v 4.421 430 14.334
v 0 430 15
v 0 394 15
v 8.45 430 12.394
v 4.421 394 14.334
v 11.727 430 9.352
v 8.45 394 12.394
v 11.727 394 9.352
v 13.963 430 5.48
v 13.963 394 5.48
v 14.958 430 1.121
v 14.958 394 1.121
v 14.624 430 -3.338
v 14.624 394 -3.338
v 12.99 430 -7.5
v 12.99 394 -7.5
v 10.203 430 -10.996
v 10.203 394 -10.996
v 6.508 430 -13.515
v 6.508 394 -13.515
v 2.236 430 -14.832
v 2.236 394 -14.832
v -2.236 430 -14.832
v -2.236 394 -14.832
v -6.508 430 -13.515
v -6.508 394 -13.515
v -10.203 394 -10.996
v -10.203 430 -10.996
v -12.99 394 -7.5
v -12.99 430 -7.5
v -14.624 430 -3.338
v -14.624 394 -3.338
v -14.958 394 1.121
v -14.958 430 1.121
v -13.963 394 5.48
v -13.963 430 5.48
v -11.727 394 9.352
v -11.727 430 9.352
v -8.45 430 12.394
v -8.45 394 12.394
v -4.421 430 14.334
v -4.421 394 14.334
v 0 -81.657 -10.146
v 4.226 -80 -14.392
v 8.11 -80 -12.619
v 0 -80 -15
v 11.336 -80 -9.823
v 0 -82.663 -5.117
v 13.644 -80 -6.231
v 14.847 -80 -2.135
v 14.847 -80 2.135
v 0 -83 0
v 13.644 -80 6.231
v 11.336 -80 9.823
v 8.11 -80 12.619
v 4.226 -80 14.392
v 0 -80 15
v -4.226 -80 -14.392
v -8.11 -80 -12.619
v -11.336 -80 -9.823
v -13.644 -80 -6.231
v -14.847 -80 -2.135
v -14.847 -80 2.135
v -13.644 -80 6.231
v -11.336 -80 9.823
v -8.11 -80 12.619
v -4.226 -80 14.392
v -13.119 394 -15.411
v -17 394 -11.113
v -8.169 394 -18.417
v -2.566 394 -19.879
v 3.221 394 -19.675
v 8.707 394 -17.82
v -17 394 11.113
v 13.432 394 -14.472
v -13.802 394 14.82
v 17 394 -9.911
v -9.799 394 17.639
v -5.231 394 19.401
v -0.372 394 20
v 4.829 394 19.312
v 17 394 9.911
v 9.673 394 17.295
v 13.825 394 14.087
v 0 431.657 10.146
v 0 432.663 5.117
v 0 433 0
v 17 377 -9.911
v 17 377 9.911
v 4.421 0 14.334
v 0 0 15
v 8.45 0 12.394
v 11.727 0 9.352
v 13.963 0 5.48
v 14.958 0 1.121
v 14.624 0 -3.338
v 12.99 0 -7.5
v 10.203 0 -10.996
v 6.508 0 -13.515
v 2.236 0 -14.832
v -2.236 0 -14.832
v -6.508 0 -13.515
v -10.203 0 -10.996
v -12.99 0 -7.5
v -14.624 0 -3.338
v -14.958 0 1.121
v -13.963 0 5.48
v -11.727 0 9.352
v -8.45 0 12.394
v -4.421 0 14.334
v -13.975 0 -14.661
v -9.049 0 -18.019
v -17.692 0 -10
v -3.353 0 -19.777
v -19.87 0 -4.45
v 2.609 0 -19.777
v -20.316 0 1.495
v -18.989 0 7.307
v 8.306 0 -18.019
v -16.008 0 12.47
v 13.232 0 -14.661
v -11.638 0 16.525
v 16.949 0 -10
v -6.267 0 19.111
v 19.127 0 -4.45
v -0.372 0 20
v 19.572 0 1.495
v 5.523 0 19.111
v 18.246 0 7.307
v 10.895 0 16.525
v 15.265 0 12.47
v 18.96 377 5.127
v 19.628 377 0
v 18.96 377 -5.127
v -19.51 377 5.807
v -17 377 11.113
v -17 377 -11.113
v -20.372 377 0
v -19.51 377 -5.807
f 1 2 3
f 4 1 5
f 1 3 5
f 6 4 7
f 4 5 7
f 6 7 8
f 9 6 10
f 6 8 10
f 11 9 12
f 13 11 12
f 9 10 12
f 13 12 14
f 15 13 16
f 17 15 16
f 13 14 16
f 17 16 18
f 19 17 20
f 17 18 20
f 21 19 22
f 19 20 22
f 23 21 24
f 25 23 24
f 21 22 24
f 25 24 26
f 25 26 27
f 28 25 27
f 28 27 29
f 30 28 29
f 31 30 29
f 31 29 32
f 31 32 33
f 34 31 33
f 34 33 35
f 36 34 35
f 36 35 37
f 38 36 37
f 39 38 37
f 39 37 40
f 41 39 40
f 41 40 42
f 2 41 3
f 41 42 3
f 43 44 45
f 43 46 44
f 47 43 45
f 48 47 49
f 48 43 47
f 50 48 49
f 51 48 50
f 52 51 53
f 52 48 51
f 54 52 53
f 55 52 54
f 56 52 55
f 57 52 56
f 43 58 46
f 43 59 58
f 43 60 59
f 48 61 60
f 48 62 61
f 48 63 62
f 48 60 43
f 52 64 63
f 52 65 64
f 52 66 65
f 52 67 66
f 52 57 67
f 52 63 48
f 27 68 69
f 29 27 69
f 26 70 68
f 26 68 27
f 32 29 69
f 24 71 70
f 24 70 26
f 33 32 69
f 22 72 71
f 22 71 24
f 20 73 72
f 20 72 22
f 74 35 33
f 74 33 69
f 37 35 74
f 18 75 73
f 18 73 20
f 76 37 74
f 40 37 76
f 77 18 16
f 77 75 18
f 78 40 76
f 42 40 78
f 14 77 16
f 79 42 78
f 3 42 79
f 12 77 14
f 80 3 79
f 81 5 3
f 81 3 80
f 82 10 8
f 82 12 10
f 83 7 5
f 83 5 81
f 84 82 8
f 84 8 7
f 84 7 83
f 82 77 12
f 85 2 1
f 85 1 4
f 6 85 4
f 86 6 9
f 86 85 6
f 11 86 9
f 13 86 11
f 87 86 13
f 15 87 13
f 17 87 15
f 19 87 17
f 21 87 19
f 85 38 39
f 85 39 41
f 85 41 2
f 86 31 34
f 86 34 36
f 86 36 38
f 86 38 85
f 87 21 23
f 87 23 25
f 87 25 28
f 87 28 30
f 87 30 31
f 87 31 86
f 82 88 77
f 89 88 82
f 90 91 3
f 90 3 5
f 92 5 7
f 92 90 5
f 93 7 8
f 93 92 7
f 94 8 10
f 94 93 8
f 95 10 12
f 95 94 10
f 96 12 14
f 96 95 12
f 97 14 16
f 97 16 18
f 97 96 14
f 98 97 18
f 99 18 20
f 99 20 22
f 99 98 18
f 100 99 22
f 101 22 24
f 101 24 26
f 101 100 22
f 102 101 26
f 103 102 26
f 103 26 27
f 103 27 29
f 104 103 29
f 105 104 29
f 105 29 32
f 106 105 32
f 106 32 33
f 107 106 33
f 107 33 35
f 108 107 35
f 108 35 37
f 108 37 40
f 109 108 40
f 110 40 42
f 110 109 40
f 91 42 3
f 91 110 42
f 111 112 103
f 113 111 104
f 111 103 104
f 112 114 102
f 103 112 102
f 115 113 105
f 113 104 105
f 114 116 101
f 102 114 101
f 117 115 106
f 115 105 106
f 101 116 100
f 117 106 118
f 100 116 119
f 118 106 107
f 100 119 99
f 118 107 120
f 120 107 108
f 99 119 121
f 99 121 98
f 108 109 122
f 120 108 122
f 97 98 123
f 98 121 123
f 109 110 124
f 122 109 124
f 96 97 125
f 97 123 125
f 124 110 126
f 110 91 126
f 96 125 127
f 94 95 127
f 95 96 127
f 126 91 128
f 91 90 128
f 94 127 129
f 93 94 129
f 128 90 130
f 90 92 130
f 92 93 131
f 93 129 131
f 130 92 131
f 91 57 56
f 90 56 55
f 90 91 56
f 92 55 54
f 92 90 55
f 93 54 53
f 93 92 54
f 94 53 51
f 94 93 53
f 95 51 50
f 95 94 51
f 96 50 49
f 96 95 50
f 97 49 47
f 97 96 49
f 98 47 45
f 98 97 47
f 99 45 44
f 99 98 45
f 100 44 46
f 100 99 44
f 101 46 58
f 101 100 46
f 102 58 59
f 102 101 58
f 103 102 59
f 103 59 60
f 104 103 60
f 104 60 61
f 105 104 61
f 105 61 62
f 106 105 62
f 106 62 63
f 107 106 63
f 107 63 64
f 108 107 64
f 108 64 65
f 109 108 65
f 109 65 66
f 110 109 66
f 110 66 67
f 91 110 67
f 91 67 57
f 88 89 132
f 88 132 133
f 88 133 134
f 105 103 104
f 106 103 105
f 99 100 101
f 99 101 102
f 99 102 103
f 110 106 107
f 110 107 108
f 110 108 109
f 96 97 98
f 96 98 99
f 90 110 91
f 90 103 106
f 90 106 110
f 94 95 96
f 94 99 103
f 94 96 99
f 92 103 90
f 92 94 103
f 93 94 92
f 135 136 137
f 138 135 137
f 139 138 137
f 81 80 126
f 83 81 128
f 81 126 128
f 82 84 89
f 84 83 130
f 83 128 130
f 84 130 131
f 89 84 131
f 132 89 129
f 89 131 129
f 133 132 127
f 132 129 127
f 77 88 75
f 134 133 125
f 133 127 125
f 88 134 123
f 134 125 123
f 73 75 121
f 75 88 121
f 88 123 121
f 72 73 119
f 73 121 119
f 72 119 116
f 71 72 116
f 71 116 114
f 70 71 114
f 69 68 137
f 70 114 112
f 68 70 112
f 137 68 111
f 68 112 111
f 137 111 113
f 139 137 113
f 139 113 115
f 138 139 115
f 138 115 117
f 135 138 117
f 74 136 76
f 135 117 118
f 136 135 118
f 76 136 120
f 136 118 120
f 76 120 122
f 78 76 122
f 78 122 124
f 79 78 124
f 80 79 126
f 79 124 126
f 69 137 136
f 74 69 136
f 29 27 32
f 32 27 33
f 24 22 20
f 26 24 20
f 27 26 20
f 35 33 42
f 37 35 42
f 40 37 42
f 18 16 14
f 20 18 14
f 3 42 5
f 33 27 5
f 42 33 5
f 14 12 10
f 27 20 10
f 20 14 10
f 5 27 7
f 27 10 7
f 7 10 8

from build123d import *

# Parameters (mm, degrees)
SKETCH1_R           = 20
SKETCH1_R_2         = 15
BOSS_EXTRUDE1_DEPTH = 394
BOSS_EXTRUDE2_START = 394
SKETCH1_2_R         = 15
BOSS_EXTRUDE2_DEPTH = 36
SKETCH1_3_R         = 15
BOSS_EXTRUDE3_DEPTH = 80
CUT_EXTRUDE1_START  = 377
CUT_EXTRUDE1_DEPTH  = 17
DOME8_FACE_RADIUS   = 15
DOME8_HEIGHT        = 3
DOME9_FACE_RADIUS   = 15
DOME9_HEIGHT        = 3


with BuildPart() as part:
    # Sketch1 → Boss-Extrude1 (new body)
    with BuildSketch(Plane(origin=(0, 0, 0), x_dir=(1, 0, 0), z_dir=(0, 1, 0))):
        with Locations(Location((-0.371790911, 0, 0), (0, 0, 270))):
            Circle(SKETCH1_R)
        with Locations(Location((0, 0, 0), (0, 0, 270))):
            Circle(SKETCH1_R_2, mode=Mode.SUBTRACT)
    extrude(amount=BOSS_EXTRUDE1_DEPTH)

    # Sketch2 → Cut-Extrude1 (cut)
    with BuildSketch(Plane(origin=(0, 0, 0), x_dir=(1, 0, 0), z_dir=(0, 1, 0)).offset(CUT_EXTRUDE1_START)):
        with BuildLine():
            Line((-17, 11.113175176), (-17, -11.113175176))
            ThreePointArc((-17, -11.113175176), (-20.371790911, 0), (-17, 11.113175176))
        make_face()
        with BuildLine():
            ThreePointArc((17, -9.91064481), (19.628209089, 0), (17, 9.91064481))
            Line((17, 9.91064481), (17, -9.91064481))
        make_face()
    extrude(amount=CUT_EXTRUDE1_DEPTH, mode=Mode.SUBTRACT)


with BuildPart() as body_2:
    # Sketch1<2> → Boss-Extrude2 (new body)
    with BuildSketch(Plane(origin=(0, 0, 0), x_dir=(1, 0, 0), z_dir=(0, 1, 0)).offset(BOSS_EXTRUDE2_START)):
        with Locations(Location((0, 0, 0), (0, 0, 270))):
            Circle(SKETCH1_2_R)
    extrude(amount=BOSS_EXTRUDE2_DEPTH)

    # Dome8: a dome of height H over a round flat face of radius A is a cap of a sphere of radius (A * A + H * H) / (2 * H)
    dome8_r = (DOME8_FACE_RADIUS * DOME8_FACE_RADIUS + DOME8_HEIGHT * DOME8_HEIGHT) / (2 * DOME8_HEIGHT)
    dome8_base = Plane((0, 430, 0), z_dir=(0, 1, 0))
    with Locations(dome8_base.offset(DOME8_HEIGHT - dome8_r)):
        dome8_ball = Sphere(dome8_r, mode=Mode.PRIVATE)
    add(split(dome8_ball, bisect_by=dome8_base, keep=Keep.TOP, mode=Mode.PRIVATE))


with BuildPart() as body_3:
    # Sketch1<3> → Boss-Extrude3 (new body)
    with BuildSketch(Plane(origin=(0, 0, 0), x_dir=(1, 0, 0), z_dir=(0, 1, 0))):
        with Locations(Location((0, 0, 0), (0, 0, 270))):
            Circle(SKETCH1_3_R)
    extrude(amount=-BOSS_EXTRUDE3_DEPTH)

    # Dome9: a dome of height H over a round flat face of radius A is a cap of a sphere of radius (A * A + H * H) / (2 * H)
    dome9_r = (DOME9_FACE_RADIUS * DOME9_FACE_RADIUS + DOME9_HEIGHT * DOME9_HEIGHT) / (2 * DOME9_HEIGHT)
    dome9_base = Plane((0, -80, 0), z_dir=(0, -1, 0))
    with Locations(dome9_base.offset(DOME9_HEIGHT - dome9_r)):
        dome9_ball = Sphere(dome9_r, mode=Mode.PRIVATE)
    add(split(dome9_ball, bisect_by=dome9_base, keep=Keep.TOP, mode=Mode.PRIVATE))


solid = Compound([part.part, body_2.part, body_3.part])
